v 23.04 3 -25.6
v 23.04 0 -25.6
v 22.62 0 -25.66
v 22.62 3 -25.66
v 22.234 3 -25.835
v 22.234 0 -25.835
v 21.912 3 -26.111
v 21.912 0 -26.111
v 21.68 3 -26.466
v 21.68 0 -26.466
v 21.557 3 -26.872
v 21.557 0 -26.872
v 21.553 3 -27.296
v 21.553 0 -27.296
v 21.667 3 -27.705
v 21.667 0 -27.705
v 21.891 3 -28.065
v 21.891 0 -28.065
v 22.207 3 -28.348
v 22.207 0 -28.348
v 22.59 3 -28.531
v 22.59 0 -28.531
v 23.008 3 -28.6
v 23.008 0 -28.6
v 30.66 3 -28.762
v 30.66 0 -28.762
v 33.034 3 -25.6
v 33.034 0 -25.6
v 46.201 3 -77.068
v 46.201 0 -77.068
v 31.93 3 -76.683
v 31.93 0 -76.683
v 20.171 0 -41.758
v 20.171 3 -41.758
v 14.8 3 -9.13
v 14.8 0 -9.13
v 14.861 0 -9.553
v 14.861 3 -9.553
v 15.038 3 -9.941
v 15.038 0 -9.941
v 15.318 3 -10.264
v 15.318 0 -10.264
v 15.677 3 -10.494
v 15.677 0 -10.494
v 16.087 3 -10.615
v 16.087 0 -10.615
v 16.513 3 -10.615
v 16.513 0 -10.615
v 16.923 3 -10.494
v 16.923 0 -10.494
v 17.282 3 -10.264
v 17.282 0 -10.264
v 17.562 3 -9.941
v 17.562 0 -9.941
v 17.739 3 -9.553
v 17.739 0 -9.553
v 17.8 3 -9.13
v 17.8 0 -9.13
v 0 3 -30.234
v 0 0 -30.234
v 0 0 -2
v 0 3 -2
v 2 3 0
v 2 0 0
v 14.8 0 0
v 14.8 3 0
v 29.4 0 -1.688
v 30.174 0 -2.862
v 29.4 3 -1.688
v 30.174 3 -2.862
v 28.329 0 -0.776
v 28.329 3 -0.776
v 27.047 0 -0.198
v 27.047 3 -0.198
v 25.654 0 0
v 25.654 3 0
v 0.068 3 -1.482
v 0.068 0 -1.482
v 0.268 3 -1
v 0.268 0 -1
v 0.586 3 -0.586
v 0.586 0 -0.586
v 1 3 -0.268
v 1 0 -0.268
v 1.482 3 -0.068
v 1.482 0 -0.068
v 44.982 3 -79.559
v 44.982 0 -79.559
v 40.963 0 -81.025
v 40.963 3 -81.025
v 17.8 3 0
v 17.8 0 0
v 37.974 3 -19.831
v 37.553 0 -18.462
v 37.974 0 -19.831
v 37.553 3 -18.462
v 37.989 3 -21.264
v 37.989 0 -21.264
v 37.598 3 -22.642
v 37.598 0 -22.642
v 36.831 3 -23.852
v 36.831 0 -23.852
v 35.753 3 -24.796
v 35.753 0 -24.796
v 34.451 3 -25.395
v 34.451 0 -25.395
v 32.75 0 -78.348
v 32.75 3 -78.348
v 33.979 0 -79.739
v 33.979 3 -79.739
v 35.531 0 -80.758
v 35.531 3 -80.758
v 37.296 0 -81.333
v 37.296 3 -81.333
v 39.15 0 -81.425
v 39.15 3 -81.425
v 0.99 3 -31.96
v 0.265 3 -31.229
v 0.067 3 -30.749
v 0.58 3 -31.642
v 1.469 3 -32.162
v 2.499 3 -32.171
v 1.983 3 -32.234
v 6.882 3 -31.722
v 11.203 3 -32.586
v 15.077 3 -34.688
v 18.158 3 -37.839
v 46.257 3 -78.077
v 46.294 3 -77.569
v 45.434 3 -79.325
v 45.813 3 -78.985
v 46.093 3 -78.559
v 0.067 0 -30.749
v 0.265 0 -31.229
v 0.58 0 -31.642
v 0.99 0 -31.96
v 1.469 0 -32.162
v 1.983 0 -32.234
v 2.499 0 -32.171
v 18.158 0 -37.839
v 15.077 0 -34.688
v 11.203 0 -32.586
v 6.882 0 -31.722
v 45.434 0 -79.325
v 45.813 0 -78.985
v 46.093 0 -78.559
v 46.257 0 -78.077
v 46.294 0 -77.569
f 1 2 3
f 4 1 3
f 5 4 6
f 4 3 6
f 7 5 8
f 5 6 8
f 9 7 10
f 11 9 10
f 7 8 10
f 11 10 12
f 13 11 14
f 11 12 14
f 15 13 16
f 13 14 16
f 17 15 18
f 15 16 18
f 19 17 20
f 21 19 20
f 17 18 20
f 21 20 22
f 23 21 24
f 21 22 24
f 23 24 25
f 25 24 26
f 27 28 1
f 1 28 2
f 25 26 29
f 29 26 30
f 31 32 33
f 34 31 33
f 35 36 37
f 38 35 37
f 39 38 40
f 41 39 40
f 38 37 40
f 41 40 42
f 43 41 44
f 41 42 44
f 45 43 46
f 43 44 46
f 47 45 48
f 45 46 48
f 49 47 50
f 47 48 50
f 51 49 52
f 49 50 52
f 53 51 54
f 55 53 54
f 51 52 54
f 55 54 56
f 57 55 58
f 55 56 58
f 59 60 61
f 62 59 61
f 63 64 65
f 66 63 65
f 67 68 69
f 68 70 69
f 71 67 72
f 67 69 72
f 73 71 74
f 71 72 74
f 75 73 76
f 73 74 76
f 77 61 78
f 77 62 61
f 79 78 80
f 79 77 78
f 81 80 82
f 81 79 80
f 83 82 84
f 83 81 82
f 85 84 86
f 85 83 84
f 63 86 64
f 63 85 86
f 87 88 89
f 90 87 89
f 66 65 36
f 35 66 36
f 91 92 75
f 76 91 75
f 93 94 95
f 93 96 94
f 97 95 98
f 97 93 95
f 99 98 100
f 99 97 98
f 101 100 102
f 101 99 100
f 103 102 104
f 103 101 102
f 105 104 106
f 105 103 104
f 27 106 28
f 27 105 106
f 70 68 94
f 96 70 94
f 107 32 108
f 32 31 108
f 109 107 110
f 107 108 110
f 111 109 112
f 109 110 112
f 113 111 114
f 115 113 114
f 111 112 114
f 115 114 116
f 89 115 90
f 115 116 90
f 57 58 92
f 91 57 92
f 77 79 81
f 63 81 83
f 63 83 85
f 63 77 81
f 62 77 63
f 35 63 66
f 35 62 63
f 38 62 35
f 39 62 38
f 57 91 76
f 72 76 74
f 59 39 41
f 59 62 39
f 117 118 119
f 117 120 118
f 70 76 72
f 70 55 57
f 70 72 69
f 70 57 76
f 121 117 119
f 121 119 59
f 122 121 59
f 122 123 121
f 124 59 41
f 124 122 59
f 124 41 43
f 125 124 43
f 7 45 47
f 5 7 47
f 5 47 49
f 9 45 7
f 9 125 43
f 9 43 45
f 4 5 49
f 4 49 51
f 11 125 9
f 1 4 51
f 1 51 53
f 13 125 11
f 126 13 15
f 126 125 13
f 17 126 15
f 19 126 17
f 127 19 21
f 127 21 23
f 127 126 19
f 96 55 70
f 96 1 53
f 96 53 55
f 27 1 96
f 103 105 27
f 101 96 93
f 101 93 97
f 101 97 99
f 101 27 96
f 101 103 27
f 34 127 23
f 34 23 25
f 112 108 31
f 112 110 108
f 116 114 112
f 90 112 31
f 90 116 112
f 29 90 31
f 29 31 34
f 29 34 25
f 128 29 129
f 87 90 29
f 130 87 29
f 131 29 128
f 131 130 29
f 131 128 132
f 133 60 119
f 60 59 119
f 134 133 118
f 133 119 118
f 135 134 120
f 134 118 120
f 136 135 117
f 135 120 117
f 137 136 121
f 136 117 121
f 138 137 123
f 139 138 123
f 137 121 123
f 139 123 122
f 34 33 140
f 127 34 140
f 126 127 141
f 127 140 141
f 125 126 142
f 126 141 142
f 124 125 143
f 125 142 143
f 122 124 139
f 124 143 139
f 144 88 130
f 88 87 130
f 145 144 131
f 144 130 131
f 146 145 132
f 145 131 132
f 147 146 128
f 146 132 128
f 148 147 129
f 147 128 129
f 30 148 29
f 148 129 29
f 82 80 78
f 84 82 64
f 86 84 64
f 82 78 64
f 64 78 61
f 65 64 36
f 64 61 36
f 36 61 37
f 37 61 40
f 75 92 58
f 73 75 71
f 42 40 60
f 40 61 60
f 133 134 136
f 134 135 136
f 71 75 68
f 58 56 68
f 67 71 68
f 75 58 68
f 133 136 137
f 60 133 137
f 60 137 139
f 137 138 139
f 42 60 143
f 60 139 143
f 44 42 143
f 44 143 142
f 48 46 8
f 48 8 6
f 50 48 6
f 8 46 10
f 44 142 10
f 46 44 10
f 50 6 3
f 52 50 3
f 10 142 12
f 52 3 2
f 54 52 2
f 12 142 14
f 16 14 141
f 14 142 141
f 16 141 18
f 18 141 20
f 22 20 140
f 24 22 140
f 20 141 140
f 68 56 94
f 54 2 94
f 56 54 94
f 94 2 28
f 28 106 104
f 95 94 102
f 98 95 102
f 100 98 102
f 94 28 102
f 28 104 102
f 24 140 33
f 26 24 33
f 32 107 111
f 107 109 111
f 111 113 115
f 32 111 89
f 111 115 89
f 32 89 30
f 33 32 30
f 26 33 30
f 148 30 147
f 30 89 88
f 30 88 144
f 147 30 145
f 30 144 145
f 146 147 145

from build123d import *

# Parameters (mm, degrees)
BOSS_EXTRUDE1_DEPTH = 3
FILLET1_R           = 5
FILLET2_R           = 2
FILLET3_R           = 7
FILLET4_R           = 2
FILLET5_R           = 5


with BuildPart() as part:
    # Sketch1 → Boss-Extrude1 (new body)
    with BuildSketch(Plane(origin=(0, 0, 0), x_dir=(1, 0, 0), z_dir=(0, 1, 0))):
        with BuildLine():
            Line((0, 33.06), (0, 0))
            Line((0, 0), (14.8, 0))
            Line((14.8, 0), (14.8, 9.13))
            ThreePointArc((14.8, 9.13), (16.3, 10.63), (17.8, 9.13))
            Line((17.8, 9.13), (17.8, 0))
            Line((17.8, 0), (28.82, 0))
            Line((28.82, 0), (40.93, 25.6))
            Line((40.93, 25.6), (23.039915269, 25.6))
            ThreePointArc((23.039915269, 25.6), (21.54, 27.084056775), (23.00803062, 28.599661085))
            Line((23.00803062, 28.599661085), (30.66, 28.762351413))
            Line((30.66, 28.762351413), (46.79, 78.9))
            Line((46.79, 78.9), (34.22, 83.484702826))
            Line((34.22, 83.484702826), (20.171354305, 41.75831525))
            ThreePointArc((20.171354305, 41.75831525), (12.025034014, 32.911797705), (0, 33.06))
        make_face()
    extrude(amount=BOSS_EXTRUDE1_DEPTH)

    # Fillet1
    fillet1_edges = [part.edges().sort_by_distance(p)[0] for p in [
        (40.93, 1.5, -25.6),
    ]]
    fillet(fillet1_edges, radius=FILLET1_R)

    # Fillet2
    fillet2_edges = [part.edges().sort_by_distance(p)[0] for p in [
        (0, 1.5, -33.06),
    ]]
    fillet(fillet2_edges, radius=FILLET2_R)

    # Fillet3
    fillet3_edges = [part.edges().sort_by_distance(p)[0] for p in [
        (34.22, 1.5, -83.484702826),
    ]]
    fillet(fillet3_edges, radius=FILLET3_R)

    # Fillet4
    fillet4_edges = [part.edges().sort_by_distance(p)[0] for p in [
        (0, 1.5, 0),
        (46.79, 1.5, -78.9),
    ]]
    fillet(fillet4_edges, radius=FILLET4_R)

    # Fillet5
    fillet5_edges = [part.edges().sort_by_distance(p)[0] for p in [
        (28.82, 1.5, 0),
    ]]
    fillet(fillet5_edges, radius=FILLET5_R)


solid = part.part
